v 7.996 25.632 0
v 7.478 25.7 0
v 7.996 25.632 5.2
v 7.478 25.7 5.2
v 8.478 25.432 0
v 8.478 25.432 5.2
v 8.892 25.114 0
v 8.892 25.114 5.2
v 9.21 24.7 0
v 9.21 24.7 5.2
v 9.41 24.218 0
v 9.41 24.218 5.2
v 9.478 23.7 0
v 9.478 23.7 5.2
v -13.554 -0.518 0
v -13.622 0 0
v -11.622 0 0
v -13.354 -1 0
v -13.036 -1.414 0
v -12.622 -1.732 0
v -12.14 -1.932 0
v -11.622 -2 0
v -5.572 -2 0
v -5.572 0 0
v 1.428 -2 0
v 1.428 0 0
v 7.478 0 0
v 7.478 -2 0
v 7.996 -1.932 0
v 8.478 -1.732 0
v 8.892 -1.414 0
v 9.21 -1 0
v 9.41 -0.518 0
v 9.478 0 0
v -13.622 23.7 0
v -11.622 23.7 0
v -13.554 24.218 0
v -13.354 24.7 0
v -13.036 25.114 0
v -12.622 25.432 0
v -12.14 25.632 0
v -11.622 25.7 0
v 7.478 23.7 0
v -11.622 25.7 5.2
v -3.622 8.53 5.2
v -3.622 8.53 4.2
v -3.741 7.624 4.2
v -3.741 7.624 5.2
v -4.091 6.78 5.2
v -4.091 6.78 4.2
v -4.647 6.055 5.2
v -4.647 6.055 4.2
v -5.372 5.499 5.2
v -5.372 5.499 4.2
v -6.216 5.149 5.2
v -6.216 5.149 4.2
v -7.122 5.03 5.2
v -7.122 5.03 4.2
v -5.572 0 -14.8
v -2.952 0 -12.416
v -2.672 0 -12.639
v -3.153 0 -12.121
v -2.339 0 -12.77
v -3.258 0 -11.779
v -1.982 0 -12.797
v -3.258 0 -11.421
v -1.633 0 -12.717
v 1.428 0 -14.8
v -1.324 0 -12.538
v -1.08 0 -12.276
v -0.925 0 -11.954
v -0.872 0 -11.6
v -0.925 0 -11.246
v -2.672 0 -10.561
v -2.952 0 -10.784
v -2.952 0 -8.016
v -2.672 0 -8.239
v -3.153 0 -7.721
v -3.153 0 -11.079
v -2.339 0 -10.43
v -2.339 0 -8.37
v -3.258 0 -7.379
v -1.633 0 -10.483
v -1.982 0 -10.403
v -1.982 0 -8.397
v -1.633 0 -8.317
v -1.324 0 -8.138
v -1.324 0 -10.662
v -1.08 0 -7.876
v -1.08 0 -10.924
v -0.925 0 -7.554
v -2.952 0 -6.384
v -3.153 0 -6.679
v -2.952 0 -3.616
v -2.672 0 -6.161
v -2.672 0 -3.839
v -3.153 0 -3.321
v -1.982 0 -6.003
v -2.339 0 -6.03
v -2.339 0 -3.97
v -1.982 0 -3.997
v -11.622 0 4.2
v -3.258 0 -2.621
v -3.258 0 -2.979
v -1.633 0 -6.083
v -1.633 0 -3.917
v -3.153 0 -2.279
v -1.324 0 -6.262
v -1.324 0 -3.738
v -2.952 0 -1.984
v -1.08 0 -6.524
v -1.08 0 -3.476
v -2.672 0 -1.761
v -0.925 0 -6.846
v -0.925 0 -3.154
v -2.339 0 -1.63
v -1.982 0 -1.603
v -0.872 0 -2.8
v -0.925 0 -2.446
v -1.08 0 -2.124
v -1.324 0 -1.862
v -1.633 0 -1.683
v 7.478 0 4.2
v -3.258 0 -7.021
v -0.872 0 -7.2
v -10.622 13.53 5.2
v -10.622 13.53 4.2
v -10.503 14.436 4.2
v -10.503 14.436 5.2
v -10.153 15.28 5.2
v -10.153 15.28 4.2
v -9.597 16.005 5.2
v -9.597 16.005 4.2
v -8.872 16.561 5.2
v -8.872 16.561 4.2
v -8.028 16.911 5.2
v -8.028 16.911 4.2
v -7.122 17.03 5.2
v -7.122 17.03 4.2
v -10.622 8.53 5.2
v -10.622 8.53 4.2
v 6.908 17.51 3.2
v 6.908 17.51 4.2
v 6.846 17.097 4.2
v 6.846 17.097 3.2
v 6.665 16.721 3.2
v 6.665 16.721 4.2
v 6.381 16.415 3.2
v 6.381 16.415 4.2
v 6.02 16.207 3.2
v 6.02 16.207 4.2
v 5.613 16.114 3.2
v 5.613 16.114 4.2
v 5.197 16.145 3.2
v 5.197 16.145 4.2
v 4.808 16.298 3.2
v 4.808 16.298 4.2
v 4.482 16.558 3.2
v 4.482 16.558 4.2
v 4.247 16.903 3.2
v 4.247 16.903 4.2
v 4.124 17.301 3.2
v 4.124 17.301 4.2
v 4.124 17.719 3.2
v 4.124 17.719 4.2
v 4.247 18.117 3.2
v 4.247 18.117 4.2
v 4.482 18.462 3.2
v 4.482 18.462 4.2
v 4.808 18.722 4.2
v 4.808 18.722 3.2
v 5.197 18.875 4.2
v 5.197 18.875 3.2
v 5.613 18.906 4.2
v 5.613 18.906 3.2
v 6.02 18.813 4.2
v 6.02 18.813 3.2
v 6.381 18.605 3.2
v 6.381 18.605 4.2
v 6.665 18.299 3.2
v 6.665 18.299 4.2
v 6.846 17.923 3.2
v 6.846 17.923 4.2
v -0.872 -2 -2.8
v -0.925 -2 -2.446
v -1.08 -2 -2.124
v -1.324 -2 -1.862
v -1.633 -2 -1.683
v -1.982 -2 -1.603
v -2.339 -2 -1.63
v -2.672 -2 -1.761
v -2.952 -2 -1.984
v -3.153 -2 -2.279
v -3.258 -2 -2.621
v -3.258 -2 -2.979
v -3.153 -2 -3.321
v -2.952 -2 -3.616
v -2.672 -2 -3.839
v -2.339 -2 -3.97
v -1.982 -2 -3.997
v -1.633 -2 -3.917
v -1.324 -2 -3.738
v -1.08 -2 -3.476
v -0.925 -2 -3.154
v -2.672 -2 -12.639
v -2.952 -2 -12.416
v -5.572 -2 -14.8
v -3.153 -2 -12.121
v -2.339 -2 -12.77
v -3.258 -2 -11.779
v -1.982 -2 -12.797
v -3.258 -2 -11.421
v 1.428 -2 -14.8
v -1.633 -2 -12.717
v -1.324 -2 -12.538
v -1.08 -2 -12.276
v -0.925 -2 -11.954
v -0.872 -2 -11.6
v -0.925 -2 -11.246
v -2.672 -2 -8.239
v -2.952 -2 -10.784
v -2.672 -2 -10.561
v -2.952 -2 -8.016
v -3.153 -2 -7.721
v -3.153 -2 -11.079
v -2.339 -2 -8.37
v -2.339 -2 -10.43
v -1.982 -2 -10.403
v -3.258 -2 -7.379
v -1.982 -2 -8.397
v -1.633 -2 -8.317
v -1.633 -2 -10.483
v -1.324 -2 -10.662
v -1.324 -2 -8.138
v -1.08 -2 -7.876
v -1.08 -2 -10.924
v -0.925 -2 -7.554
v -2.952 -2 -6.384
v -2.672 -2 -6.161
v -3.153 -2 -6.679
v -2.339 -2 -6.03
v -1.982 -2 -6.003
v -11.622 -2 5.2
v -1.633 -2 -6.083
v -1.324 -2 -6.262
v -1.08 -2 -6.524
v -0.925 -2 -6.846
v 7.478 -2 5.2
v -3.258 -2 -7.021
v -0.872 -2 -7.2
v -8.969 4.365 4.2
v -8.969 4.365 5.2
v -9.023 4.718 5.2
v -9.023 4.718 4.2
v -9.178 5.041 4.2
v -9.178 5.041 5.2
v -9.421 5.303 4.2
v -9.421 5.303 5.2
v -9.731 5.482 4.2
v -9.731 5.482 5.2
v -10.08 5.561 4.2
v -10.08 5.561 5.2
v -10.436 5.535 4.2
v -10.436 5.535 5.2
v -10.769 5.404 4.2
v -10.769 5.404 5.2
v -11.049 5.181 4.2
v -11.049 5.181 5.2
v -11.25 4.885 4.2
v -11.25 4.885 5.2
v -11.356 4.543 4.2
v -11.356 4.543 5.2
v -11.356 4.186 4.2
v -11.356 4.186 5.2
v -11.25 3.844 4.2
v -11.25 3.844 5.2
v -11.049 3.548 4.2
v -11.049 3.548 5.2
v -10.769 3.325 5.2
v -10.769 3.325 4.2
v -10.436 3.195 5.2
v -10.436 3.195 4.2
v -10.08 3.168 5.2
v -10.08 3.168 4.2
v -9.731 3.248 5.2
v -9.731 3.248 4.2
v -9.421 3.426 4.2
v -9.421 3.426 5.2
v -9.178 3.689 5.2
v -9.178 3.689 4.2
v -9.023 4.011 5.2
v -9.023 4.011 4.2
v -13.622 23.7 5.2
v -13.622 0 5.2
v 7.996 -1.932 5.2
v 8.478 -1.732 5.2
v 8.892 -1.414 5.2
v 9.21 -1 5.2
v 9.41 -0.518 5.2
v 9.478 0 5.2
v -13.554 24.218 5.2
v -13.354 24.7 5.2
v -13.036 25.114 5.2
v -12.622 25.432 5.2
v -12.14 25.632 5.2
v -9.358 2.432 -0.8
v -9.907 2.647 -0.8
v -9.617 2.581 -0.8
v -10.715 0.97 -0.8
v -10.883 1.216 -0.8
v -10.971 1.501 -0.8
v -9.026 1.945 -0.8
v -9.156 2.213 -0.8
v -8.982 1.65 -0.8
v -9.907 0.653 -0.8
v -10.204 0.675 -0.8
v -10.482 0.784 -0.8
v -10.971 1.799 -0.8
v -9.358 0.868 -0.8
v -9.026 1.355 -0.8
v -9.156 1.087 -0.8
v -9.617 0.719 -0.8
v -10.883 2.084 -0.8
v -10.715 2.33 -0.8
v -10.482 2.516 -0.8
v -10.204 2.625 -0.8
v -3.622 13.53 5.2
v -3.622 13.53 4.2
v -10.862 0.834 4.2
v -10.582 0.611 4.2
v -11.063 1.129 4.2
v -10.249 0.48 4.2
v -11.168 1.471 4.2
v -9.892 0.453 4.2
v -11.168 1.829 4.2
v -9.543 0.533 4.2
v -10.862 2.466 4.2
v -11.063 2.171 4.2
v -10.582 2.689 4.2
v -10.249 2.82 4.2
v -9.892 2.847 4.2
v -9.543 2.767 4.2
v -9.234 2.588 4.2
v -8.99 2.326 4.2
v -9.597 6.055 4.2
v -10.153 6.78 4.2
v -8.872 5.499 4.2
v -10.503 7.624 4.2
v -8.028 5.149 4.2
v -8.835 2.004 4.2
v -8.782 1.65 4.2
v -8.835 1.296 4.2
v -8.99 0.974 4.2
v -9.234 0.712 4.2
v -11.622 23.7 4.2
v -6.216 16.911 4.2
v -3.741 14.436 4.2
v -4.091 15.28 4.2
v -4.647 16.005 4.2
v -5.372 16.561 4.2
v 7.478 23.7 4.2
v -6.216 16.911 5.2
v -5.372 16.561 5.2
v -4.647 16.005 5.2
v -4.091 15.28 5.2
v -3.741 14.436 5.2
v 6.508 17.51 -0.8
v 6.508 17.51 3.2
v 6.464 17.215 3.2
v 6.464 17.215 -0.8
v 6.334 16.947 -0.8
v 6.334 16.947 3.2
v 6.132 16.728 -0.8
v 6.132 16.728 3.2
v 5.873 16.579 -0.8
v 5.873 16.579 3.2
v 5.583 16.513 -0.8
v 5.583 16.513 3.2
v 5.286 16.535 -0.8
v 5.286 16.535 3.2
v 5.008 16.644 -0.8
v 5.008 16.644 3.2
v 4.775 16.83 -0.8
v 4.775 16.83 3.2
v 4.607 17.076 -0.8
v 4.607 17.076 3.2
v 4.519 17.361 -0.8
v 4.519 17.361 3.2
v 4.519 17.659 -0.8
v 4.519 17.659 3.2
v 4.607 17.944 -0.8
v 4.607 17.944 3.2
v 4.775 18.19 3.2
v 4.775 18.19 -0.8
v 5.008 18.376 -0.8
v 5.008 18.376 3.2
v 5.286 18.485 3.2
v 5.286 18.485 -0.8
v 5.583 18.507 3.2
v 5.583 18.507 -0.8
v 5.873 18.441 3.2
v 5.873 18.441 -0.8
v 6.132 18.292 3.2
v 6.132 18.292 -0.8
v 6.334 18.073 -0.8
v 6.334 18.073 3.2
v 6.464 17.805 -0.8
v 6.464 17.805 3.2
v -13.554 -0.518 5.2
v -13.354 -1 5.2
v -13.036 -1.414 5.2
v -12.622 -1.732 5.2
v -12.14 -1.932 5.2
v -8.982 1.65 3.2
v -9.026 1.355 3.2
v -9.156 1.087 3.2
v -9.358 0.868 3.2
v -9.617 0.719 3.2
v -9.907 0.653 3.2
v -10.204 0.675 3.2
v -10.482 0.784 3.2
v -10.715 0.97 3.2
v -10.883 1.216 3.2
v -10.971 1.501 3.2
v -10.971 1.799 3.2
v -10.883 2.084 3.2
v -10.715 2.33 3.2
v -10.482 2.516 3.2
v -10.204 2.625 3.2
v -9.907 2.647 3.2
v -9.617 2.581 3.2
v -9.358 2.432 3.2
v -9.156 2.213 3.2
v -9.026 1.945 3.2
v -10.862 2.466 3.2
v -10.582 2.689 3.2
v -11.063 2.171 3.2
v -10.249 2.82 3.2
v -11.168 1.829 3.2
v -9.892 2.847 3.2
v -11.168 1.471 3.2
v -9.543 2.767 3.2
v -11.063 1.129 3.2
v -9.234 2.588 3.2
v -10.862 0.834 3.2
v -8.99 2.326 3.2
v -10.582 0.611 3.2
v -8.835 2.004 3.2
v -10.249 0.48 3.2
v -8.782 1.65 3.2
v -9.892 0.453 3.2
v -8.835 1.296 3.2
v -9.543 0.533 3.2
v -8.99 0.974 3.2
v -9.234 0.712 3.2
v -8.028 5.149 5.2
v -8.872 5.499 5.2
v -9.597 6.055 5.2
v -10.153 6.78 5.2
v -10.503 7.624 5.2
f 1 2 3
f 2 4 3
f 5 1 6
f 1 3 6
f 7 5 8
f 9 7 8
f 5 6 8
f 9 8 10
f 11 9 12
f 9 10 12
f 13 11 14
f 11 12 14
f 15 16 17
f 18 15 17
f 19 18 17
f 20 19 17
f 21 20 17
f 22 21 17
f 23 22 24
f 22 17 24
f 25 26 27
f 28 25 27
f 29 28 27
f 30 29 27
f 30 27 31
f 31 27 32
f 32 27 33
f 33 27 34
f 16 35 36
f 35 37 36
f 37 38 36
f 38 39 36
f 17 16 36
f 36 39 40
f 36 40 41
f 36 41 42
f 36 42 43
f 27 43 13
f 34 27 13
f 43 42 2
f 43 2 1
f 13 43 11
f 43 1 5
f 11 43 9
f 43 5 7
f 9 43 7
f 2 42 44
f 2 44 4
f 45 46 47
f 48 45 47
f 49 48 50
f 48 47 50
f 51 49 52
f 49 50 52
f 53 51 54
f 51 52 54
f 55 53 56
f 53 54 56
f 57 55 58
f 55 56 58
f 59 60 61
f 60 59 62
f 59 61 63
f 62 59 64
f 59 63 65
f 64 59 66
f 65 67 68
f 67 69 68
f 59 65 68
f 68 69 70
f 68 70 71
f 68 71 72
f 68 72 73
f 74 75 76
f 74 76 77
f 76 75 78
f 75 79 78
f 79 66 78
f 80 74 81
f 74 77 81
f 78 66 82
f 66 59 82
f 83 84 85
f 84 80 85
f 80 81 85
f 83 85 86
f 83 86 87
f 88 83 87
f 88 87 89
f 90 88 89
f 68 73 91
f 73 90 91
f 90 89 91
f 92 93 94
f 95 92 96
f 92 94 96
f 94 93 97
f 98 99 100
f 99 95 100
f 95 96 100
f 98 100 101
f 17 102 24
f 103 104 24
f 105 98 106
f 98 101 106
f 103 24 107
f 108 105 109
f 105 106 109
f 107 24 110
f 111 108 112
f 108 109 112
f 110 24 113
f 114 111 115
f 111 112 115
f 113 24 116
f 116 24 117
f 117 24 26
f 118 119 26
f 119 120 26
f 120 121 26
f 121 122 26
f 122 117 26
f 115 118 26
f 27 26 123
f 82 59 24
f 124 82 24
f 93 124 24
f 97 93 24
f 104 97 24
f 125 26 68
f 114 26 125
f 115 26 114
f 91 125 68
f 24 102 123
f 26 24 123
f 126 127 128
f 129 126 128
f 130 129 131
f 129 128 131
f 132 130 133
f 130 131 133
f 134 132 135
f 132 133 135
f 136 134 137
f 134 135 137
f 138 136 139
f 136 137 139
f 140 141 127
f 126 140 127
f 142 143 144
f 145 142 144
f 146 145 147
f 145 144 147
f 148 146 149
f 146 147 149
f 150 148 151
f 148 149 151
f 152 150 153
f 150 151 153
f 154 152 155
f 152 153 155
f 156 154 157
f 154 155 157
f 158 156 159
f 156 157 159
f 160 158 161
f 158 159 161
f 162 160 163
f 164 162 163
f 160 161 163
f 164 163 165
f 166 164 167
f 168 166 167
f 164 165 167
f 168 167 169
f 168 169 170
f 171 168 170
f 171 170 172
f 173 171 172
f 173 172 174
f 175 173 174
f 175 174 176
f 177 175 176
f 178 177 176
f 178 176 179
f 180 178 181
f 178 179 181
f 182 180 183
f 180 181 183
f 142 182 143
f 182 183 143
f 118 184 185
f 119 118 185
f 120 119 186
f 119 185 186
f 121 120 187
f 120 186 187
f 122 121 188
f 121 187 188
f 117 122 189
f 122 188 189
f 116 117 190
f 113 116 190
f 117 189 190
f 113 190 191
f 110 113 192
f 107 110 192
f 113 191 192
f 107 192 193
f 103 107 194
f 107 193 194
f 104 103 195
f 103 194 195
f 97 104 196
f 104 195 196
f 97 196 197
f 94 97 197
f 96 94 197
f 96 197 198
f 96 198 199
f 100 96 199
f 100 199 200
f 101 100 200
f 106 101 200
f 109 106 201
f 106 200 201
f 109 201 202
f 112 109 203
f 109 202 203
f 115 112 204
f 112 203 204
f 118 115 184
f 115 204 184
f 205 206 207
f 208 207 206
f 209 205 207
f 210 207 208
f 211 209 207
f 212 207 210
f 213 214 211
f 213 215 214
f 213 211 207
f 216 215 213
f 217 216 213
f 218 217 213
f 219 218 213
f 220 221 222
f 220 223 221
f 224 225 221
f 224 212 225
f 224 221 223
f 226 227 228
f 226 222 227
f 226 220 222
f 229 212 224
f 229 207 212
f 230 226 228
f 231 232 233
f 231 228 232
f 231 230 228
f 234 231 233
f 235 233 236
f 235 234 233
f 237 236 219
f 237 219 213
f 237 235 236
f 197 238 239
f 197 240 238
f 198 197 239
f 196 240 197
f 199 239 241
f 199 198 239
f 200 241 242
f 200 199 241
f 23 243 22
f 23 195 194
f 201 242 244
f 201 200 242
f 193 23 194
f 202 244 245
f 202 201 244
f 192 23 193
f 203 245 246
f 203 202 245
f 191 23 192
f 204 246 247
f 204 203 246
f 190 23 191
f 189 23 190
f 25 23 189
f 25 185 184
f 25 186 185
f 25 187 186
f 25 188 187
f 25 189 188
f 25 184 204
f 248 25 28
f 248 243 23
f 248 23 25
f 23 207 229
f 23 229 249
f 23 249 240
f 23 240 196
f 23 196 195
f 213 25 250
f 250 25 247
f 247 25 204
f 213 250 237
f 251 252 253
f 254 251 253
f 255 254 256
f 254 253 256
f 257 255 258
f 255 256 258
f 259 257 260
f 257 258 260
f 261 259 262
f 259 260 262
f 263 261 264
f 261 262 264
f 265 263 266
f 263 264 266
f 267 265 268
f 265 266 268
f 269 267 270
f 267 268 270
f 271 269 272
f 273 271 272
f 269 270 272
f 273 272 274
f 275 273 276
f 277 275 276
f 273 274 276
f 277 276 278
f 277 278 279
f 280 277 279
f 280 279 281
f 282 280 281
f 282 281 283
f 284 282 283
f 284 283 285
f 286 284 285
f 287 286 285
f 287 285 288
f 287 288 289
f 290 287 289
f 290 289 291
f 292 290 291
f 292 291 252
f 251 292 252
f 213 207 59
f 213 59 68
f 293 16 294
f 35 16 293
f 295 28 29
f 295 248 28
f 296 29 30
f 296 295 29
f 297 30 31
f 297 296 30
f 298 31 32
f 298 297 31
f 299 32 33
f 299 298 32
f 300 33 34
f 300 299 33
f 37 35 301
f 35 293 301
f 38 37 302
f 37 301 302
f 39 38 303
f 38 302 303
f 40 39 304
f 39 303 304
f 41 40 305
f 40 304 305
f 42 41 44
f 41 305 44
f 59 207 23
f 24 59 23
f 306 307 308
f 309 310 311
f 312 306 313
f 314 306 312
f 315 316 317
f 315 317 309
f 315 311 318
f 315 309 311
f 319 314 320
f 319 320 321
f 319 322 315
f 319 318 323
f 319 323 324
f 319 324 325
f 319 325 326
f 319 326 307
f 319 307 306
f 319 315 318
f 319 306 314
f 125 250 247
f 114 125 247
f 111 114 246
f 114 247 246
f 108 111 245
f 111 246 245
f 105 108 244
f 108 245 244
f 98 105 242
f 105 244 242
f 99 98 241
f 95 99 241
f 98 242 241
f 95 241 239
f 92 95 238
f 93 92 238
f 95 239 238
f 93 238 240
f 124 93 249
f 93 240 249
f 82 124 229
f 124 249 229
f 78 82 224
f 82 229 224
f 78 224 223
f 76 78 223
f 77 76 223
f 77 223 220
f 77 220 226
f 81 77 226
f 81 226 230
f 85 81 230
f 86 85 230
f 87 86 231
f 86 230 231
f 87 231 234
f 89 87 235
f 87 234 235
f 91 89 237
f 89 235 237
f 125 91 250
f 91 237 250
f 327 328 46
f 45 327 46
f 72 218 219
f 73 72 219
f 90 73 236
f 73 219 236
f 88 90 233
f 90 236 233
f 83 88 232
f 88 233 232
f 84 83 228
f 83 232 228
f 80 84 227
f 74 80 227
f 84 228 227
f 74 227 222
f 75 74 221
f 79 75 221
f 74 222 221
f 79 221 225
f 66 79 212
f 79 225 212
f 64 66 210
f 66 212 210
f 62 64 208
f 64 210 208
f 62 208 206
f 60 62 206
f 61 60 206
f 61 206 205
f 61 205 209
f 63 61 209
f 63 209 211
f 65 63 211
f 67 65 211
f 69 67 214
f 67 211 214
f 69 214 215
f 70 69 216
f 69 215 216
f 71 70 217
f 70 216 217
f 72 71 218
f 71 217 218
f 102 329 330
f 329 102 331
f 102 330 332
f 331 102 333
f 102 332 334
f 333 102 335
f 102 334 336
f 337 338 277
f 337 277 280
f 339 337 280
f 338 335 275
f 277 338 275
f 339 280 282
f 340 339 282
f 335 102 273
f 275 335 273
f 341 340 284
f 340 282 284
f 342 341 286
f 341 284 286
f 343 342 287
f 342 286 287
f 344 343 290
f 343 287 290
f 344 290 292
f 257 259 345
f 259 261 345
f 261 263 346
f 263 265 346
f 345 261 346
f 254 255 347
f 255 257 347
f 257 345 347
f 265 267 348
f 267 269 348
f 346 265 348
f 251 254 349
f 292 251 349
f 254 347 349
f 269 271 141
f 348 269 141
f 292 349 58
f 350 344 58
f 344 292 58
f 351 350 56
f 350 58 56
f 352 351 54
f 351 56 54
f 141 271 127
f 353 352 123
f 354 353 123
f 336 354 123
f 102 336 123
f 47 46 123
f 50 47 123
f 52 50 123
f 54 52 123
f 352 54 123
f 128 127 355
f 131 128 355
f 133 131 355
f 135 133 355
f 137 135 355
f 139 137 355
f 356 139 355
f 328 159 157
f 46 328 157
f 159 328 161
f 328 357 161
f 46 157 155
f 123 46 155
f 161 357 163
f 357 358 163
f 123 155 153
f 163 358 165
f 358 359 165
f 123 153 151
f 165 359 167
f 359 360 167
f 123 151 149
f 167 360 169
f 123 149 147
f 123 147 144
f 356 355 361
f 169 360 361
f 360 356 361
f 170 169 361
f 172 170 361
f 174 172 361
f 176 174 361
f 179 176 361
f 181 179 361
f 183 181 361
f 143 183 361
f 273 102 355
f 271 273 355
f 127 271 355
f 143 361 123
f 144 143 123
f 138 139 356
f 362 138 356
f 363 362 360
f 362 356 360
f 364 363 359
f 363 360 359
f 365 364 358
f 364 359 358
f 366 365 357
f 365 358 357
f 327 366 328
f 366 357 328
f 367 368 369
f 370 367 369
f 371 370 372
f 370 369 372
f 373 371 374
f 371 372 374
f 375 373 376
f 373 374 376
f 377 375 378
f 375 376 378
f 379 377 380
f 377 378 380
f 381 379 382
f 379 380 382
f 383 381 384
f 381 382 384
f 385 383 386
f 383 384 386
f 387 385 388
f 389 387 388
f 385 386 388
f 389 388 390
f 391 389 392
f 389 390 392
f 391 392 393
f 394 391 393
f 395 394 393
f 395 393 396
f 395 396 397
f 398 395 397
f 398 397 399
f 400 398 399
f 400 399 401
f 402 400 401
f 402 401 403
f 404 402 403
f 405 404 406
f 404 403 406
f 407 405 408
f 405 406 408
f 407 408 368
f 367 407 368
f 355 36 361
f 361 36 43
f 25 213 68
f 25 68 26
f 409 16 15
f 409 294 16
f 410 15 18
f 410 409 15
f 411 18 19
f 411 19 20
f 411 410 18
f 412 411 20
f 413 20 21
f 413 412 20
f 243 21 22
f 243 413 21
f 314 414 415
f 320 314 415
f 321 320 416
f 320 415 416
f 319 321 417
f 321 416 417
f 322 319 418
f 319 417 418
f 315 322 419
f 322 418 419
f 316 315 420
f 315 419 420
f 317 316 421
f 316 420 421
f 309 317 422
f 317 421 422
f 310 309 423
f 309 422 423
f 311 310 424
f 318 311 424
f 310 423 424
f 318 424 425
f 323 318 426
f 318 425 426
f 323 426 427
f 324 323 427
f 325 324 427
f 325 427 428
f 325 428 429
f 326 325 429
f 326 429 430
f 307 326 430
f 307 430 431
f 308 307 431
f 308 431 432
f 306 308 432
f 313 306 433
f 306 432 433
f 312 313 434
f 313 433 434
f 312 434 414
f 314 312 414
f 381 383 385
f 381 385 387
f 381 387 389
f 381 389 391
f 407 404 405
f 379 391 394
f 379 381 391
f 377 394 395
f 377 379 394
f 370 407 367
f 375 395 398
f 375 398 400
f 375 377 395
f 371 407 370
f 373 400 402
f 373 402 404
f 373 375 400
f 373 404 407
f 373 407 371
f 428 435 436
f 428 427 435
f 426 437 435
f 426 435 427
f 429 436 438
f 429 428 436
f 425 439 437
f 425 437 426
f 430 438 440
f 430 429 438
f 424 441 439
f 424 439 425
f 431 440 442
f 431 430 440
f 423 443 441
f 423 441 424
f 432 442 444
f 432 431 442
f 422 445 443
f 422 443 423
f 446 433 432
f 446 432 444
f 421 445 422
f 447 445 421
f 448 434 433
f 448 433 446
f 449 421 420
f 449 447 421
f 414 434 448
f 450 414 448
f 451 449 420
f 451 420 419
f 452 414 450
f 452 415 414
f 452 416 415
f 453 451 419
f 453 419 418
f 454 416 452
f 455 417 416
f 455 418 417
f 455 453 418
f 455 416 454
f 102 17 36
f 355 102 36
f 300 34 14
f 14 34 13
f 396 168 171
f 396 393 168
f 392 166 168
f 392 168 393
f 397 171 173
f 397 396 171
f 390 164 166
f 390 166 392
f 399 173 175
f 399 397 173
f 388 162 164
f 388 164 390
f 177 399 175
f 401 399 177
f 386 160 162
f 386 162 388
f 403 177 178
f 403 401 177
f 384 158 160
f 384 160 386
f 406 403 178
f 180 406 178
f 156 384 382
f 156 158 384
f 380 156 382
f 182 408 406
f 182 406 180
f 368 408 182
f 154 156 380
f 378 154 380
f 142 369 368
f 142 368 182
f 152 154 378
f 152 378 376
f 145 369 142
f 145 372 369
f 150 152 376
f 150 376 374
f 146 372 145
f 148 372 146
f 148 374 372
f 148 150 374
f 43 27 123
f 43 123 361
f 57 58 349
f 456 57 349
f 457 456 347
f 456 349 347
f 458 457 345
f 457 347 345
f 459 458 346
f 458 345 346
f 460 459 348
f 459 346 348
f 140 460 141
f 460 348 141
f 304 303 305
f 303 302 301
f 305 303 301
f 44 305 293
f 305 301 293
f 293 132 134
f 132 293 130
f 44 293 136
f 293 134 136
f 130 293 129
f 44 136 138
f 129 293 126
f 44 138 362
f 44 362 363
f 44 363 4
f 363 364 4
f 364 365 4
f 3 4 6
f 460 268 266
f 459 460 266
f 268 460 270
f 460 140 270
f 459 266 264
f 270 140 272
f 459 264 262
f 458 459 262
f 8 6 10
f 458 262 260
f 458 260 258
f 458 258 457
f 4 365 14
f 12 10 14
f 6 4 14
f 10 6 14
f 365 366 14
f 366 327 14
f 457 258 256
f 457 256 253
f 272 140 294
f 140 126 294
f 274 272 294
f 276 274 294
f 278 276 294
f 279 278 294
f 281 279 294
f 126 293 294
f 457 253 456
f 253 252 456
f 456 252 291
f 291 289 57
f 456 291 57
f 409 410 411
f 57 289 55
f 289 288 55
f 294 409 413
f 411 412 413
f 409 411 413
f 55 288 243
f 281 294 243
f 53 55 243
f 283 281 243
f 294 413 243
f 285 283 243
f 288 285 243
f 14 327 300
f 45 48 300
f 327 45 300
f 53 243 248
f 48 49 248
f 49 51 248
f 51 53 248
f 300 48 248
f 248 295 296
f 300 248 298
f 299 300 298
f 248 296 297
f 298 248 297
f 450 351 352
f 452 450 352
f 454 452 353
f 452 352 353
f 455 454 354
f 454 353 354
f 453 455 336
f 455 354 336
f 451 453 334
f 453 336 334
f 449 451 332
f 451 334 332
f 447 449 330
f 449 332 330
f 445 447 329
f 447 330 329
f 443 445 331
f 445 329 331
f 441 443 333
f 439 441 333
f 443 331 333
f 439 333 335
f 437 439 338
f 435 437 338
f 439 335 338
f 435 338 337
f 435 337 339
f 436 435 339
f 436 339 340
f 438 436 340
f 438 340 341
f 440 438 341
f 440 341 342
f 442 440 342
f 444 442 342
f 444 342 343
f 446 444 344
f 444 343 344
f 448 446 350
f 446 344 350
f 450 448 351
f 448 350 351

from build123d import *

# Parameters (mm, degrees)
F0_W      = 23.1
F0_H      = 27.7
F1_DEPTH  = 5.2
F2_W      = 19.1
F2_H      = 23.7
F3_DEPTH  = 4.2
F4_R      = 1.4
F4_R_2    = 1.2
F5_DEPTH  = 1
F6_R      = 1
F7_DEPTH  = 4
F8_W      = 23.1
F8_H      = 27.7
F8_R      = 1.2
F9_DEPTH  = 6.001
F10_R     = 2
F11_W     = 7
F11_H     = 20
F11_R     = 1.2
F12_DEPTH = 2


with BuildPart() as f1:
    # F0 (on Top) → F1 (new body)
    with BuildSketch(Plane.XY):
        with Locations((-2.071892, 11.85)):
            Rectangle(F0_W, F0_H)
        with BuildLine():
            Line((-10.621892, 8.53), (-10.621892, 13.53))
            ThreePointArc((-10.621892, 13.53), (-9.596766, 16.004874), (-7.121892, 17.03))
            ThreePointArc((-7.121892, 17.03), (-4.647019, 16.004874), (-3.621892, 13.53))
            Line((-3.621892, 13.53), (-3.621892, 8.53))
            ThreePointArc((-3.621892, 8.53), (-4.647019, 6.055126), (-7.121892, 5.03))
            ThreePointArc((-7.121892, 5.03), (-9.596766, 6.055126), (-10.621892, 8.53))
        make_face(mode=Mode.SUBTRACT)
    extrude(amount=F1_DEPTH)

    # F2 (on Top) → F3 (cut)
    with BuildSketch(Plane.XY):
        with Locations((-2.071892, 11.85)):
            Rectangle(F2_W, F2_H)
    extrude(amount=F3_DEPTH, mode=Mode.SUBTRACT)

    # F4 (on face) → F5 (join)
    with BuildSketch(Plane(origin=(0, 0, 4.2), x_dir=(1, 0, 0), z_dir=(0, 0, -1))):
        with Locations((5.508108, -17.51)):
            Circle(F4_R)
        with Locations((-9.981892, -1.65)):
            Circle(F4_R_2)
    extrude(amount=F5_DEPTH)

    # F6 (on face) → F7 (join)
    with BuildSketch(Plane(origin=(0, 0, 3.2), x_dir=(1, 0, 0), z_dir=(0, 0, -1))):
        with Locations((-9.981892, -1.65)):
            Circle(F6_R)
        with Locations((5.508108, -17.51)):
            Circle(F6_R)
    extrude(amount=F7_DEPTH)

    # F8 (on face) → F9 (intersect, through all)
    with BuildSketch(Plane.XY.offset(5.2)):
        with Locations((-2.071892, 11.85)):
            Rectangle(F8_W, F8_H)
        with Locations((-10.169229, 4.364627)):
            Circle(F8_R, mode=Mode.SUBTRACT)
        with BuildLine():
            Line((-3.621892, 13.53), (-3.621892, 8.53))
            ThreePointArc((-3.621892, 8.53), (-7.121892, 5.03), (-10.621892, 8.53))
            Line((-10.621892, 8.53), (-10.621892, 13.53))
            ThreePointArc((-10.621892, 13.53), (-7.121892, 17.03), (-3.621892, 13.53))
        make_face(mode=Mode.SUBTRACT)
    extrude(amount=-F9_DEPTH, mode=Mode.INTERSECT)

    # F10
    f10_edges = [f1.edges().sort_by_distance(p)[0] for p in [
        (-13.621892, 25.7, 2.6),
        (-13.621892, -2, 2.6),
        (9.478108, -2, 2.6),
        (9.478108, 25.7, 2.6),
    ]]
    fillet(f10_edges, radius=F10_R)

    # F11 (on face) → F12 (join)
    with BuildSketch(Plane.XZ.offset(2)):
        with Locations((-2.071892, -4.8)):
            Rectangle(F11_W, F11_H)
        with Locations((-2.071892, -7.2)):
            Circle(F11_R, mode=Mode.SUBTRACT)
        with Locations((-2.071892, -11.6)):
            Circle(F11_R, mode=Mode.SUBTRACT)
        with Locations((-2.071892, -2.8)):
            Circle(F11_R, mode=Mode.SUBTRACT)
    extrude(amount=-F12_DEPTH)


solid = f1.part
